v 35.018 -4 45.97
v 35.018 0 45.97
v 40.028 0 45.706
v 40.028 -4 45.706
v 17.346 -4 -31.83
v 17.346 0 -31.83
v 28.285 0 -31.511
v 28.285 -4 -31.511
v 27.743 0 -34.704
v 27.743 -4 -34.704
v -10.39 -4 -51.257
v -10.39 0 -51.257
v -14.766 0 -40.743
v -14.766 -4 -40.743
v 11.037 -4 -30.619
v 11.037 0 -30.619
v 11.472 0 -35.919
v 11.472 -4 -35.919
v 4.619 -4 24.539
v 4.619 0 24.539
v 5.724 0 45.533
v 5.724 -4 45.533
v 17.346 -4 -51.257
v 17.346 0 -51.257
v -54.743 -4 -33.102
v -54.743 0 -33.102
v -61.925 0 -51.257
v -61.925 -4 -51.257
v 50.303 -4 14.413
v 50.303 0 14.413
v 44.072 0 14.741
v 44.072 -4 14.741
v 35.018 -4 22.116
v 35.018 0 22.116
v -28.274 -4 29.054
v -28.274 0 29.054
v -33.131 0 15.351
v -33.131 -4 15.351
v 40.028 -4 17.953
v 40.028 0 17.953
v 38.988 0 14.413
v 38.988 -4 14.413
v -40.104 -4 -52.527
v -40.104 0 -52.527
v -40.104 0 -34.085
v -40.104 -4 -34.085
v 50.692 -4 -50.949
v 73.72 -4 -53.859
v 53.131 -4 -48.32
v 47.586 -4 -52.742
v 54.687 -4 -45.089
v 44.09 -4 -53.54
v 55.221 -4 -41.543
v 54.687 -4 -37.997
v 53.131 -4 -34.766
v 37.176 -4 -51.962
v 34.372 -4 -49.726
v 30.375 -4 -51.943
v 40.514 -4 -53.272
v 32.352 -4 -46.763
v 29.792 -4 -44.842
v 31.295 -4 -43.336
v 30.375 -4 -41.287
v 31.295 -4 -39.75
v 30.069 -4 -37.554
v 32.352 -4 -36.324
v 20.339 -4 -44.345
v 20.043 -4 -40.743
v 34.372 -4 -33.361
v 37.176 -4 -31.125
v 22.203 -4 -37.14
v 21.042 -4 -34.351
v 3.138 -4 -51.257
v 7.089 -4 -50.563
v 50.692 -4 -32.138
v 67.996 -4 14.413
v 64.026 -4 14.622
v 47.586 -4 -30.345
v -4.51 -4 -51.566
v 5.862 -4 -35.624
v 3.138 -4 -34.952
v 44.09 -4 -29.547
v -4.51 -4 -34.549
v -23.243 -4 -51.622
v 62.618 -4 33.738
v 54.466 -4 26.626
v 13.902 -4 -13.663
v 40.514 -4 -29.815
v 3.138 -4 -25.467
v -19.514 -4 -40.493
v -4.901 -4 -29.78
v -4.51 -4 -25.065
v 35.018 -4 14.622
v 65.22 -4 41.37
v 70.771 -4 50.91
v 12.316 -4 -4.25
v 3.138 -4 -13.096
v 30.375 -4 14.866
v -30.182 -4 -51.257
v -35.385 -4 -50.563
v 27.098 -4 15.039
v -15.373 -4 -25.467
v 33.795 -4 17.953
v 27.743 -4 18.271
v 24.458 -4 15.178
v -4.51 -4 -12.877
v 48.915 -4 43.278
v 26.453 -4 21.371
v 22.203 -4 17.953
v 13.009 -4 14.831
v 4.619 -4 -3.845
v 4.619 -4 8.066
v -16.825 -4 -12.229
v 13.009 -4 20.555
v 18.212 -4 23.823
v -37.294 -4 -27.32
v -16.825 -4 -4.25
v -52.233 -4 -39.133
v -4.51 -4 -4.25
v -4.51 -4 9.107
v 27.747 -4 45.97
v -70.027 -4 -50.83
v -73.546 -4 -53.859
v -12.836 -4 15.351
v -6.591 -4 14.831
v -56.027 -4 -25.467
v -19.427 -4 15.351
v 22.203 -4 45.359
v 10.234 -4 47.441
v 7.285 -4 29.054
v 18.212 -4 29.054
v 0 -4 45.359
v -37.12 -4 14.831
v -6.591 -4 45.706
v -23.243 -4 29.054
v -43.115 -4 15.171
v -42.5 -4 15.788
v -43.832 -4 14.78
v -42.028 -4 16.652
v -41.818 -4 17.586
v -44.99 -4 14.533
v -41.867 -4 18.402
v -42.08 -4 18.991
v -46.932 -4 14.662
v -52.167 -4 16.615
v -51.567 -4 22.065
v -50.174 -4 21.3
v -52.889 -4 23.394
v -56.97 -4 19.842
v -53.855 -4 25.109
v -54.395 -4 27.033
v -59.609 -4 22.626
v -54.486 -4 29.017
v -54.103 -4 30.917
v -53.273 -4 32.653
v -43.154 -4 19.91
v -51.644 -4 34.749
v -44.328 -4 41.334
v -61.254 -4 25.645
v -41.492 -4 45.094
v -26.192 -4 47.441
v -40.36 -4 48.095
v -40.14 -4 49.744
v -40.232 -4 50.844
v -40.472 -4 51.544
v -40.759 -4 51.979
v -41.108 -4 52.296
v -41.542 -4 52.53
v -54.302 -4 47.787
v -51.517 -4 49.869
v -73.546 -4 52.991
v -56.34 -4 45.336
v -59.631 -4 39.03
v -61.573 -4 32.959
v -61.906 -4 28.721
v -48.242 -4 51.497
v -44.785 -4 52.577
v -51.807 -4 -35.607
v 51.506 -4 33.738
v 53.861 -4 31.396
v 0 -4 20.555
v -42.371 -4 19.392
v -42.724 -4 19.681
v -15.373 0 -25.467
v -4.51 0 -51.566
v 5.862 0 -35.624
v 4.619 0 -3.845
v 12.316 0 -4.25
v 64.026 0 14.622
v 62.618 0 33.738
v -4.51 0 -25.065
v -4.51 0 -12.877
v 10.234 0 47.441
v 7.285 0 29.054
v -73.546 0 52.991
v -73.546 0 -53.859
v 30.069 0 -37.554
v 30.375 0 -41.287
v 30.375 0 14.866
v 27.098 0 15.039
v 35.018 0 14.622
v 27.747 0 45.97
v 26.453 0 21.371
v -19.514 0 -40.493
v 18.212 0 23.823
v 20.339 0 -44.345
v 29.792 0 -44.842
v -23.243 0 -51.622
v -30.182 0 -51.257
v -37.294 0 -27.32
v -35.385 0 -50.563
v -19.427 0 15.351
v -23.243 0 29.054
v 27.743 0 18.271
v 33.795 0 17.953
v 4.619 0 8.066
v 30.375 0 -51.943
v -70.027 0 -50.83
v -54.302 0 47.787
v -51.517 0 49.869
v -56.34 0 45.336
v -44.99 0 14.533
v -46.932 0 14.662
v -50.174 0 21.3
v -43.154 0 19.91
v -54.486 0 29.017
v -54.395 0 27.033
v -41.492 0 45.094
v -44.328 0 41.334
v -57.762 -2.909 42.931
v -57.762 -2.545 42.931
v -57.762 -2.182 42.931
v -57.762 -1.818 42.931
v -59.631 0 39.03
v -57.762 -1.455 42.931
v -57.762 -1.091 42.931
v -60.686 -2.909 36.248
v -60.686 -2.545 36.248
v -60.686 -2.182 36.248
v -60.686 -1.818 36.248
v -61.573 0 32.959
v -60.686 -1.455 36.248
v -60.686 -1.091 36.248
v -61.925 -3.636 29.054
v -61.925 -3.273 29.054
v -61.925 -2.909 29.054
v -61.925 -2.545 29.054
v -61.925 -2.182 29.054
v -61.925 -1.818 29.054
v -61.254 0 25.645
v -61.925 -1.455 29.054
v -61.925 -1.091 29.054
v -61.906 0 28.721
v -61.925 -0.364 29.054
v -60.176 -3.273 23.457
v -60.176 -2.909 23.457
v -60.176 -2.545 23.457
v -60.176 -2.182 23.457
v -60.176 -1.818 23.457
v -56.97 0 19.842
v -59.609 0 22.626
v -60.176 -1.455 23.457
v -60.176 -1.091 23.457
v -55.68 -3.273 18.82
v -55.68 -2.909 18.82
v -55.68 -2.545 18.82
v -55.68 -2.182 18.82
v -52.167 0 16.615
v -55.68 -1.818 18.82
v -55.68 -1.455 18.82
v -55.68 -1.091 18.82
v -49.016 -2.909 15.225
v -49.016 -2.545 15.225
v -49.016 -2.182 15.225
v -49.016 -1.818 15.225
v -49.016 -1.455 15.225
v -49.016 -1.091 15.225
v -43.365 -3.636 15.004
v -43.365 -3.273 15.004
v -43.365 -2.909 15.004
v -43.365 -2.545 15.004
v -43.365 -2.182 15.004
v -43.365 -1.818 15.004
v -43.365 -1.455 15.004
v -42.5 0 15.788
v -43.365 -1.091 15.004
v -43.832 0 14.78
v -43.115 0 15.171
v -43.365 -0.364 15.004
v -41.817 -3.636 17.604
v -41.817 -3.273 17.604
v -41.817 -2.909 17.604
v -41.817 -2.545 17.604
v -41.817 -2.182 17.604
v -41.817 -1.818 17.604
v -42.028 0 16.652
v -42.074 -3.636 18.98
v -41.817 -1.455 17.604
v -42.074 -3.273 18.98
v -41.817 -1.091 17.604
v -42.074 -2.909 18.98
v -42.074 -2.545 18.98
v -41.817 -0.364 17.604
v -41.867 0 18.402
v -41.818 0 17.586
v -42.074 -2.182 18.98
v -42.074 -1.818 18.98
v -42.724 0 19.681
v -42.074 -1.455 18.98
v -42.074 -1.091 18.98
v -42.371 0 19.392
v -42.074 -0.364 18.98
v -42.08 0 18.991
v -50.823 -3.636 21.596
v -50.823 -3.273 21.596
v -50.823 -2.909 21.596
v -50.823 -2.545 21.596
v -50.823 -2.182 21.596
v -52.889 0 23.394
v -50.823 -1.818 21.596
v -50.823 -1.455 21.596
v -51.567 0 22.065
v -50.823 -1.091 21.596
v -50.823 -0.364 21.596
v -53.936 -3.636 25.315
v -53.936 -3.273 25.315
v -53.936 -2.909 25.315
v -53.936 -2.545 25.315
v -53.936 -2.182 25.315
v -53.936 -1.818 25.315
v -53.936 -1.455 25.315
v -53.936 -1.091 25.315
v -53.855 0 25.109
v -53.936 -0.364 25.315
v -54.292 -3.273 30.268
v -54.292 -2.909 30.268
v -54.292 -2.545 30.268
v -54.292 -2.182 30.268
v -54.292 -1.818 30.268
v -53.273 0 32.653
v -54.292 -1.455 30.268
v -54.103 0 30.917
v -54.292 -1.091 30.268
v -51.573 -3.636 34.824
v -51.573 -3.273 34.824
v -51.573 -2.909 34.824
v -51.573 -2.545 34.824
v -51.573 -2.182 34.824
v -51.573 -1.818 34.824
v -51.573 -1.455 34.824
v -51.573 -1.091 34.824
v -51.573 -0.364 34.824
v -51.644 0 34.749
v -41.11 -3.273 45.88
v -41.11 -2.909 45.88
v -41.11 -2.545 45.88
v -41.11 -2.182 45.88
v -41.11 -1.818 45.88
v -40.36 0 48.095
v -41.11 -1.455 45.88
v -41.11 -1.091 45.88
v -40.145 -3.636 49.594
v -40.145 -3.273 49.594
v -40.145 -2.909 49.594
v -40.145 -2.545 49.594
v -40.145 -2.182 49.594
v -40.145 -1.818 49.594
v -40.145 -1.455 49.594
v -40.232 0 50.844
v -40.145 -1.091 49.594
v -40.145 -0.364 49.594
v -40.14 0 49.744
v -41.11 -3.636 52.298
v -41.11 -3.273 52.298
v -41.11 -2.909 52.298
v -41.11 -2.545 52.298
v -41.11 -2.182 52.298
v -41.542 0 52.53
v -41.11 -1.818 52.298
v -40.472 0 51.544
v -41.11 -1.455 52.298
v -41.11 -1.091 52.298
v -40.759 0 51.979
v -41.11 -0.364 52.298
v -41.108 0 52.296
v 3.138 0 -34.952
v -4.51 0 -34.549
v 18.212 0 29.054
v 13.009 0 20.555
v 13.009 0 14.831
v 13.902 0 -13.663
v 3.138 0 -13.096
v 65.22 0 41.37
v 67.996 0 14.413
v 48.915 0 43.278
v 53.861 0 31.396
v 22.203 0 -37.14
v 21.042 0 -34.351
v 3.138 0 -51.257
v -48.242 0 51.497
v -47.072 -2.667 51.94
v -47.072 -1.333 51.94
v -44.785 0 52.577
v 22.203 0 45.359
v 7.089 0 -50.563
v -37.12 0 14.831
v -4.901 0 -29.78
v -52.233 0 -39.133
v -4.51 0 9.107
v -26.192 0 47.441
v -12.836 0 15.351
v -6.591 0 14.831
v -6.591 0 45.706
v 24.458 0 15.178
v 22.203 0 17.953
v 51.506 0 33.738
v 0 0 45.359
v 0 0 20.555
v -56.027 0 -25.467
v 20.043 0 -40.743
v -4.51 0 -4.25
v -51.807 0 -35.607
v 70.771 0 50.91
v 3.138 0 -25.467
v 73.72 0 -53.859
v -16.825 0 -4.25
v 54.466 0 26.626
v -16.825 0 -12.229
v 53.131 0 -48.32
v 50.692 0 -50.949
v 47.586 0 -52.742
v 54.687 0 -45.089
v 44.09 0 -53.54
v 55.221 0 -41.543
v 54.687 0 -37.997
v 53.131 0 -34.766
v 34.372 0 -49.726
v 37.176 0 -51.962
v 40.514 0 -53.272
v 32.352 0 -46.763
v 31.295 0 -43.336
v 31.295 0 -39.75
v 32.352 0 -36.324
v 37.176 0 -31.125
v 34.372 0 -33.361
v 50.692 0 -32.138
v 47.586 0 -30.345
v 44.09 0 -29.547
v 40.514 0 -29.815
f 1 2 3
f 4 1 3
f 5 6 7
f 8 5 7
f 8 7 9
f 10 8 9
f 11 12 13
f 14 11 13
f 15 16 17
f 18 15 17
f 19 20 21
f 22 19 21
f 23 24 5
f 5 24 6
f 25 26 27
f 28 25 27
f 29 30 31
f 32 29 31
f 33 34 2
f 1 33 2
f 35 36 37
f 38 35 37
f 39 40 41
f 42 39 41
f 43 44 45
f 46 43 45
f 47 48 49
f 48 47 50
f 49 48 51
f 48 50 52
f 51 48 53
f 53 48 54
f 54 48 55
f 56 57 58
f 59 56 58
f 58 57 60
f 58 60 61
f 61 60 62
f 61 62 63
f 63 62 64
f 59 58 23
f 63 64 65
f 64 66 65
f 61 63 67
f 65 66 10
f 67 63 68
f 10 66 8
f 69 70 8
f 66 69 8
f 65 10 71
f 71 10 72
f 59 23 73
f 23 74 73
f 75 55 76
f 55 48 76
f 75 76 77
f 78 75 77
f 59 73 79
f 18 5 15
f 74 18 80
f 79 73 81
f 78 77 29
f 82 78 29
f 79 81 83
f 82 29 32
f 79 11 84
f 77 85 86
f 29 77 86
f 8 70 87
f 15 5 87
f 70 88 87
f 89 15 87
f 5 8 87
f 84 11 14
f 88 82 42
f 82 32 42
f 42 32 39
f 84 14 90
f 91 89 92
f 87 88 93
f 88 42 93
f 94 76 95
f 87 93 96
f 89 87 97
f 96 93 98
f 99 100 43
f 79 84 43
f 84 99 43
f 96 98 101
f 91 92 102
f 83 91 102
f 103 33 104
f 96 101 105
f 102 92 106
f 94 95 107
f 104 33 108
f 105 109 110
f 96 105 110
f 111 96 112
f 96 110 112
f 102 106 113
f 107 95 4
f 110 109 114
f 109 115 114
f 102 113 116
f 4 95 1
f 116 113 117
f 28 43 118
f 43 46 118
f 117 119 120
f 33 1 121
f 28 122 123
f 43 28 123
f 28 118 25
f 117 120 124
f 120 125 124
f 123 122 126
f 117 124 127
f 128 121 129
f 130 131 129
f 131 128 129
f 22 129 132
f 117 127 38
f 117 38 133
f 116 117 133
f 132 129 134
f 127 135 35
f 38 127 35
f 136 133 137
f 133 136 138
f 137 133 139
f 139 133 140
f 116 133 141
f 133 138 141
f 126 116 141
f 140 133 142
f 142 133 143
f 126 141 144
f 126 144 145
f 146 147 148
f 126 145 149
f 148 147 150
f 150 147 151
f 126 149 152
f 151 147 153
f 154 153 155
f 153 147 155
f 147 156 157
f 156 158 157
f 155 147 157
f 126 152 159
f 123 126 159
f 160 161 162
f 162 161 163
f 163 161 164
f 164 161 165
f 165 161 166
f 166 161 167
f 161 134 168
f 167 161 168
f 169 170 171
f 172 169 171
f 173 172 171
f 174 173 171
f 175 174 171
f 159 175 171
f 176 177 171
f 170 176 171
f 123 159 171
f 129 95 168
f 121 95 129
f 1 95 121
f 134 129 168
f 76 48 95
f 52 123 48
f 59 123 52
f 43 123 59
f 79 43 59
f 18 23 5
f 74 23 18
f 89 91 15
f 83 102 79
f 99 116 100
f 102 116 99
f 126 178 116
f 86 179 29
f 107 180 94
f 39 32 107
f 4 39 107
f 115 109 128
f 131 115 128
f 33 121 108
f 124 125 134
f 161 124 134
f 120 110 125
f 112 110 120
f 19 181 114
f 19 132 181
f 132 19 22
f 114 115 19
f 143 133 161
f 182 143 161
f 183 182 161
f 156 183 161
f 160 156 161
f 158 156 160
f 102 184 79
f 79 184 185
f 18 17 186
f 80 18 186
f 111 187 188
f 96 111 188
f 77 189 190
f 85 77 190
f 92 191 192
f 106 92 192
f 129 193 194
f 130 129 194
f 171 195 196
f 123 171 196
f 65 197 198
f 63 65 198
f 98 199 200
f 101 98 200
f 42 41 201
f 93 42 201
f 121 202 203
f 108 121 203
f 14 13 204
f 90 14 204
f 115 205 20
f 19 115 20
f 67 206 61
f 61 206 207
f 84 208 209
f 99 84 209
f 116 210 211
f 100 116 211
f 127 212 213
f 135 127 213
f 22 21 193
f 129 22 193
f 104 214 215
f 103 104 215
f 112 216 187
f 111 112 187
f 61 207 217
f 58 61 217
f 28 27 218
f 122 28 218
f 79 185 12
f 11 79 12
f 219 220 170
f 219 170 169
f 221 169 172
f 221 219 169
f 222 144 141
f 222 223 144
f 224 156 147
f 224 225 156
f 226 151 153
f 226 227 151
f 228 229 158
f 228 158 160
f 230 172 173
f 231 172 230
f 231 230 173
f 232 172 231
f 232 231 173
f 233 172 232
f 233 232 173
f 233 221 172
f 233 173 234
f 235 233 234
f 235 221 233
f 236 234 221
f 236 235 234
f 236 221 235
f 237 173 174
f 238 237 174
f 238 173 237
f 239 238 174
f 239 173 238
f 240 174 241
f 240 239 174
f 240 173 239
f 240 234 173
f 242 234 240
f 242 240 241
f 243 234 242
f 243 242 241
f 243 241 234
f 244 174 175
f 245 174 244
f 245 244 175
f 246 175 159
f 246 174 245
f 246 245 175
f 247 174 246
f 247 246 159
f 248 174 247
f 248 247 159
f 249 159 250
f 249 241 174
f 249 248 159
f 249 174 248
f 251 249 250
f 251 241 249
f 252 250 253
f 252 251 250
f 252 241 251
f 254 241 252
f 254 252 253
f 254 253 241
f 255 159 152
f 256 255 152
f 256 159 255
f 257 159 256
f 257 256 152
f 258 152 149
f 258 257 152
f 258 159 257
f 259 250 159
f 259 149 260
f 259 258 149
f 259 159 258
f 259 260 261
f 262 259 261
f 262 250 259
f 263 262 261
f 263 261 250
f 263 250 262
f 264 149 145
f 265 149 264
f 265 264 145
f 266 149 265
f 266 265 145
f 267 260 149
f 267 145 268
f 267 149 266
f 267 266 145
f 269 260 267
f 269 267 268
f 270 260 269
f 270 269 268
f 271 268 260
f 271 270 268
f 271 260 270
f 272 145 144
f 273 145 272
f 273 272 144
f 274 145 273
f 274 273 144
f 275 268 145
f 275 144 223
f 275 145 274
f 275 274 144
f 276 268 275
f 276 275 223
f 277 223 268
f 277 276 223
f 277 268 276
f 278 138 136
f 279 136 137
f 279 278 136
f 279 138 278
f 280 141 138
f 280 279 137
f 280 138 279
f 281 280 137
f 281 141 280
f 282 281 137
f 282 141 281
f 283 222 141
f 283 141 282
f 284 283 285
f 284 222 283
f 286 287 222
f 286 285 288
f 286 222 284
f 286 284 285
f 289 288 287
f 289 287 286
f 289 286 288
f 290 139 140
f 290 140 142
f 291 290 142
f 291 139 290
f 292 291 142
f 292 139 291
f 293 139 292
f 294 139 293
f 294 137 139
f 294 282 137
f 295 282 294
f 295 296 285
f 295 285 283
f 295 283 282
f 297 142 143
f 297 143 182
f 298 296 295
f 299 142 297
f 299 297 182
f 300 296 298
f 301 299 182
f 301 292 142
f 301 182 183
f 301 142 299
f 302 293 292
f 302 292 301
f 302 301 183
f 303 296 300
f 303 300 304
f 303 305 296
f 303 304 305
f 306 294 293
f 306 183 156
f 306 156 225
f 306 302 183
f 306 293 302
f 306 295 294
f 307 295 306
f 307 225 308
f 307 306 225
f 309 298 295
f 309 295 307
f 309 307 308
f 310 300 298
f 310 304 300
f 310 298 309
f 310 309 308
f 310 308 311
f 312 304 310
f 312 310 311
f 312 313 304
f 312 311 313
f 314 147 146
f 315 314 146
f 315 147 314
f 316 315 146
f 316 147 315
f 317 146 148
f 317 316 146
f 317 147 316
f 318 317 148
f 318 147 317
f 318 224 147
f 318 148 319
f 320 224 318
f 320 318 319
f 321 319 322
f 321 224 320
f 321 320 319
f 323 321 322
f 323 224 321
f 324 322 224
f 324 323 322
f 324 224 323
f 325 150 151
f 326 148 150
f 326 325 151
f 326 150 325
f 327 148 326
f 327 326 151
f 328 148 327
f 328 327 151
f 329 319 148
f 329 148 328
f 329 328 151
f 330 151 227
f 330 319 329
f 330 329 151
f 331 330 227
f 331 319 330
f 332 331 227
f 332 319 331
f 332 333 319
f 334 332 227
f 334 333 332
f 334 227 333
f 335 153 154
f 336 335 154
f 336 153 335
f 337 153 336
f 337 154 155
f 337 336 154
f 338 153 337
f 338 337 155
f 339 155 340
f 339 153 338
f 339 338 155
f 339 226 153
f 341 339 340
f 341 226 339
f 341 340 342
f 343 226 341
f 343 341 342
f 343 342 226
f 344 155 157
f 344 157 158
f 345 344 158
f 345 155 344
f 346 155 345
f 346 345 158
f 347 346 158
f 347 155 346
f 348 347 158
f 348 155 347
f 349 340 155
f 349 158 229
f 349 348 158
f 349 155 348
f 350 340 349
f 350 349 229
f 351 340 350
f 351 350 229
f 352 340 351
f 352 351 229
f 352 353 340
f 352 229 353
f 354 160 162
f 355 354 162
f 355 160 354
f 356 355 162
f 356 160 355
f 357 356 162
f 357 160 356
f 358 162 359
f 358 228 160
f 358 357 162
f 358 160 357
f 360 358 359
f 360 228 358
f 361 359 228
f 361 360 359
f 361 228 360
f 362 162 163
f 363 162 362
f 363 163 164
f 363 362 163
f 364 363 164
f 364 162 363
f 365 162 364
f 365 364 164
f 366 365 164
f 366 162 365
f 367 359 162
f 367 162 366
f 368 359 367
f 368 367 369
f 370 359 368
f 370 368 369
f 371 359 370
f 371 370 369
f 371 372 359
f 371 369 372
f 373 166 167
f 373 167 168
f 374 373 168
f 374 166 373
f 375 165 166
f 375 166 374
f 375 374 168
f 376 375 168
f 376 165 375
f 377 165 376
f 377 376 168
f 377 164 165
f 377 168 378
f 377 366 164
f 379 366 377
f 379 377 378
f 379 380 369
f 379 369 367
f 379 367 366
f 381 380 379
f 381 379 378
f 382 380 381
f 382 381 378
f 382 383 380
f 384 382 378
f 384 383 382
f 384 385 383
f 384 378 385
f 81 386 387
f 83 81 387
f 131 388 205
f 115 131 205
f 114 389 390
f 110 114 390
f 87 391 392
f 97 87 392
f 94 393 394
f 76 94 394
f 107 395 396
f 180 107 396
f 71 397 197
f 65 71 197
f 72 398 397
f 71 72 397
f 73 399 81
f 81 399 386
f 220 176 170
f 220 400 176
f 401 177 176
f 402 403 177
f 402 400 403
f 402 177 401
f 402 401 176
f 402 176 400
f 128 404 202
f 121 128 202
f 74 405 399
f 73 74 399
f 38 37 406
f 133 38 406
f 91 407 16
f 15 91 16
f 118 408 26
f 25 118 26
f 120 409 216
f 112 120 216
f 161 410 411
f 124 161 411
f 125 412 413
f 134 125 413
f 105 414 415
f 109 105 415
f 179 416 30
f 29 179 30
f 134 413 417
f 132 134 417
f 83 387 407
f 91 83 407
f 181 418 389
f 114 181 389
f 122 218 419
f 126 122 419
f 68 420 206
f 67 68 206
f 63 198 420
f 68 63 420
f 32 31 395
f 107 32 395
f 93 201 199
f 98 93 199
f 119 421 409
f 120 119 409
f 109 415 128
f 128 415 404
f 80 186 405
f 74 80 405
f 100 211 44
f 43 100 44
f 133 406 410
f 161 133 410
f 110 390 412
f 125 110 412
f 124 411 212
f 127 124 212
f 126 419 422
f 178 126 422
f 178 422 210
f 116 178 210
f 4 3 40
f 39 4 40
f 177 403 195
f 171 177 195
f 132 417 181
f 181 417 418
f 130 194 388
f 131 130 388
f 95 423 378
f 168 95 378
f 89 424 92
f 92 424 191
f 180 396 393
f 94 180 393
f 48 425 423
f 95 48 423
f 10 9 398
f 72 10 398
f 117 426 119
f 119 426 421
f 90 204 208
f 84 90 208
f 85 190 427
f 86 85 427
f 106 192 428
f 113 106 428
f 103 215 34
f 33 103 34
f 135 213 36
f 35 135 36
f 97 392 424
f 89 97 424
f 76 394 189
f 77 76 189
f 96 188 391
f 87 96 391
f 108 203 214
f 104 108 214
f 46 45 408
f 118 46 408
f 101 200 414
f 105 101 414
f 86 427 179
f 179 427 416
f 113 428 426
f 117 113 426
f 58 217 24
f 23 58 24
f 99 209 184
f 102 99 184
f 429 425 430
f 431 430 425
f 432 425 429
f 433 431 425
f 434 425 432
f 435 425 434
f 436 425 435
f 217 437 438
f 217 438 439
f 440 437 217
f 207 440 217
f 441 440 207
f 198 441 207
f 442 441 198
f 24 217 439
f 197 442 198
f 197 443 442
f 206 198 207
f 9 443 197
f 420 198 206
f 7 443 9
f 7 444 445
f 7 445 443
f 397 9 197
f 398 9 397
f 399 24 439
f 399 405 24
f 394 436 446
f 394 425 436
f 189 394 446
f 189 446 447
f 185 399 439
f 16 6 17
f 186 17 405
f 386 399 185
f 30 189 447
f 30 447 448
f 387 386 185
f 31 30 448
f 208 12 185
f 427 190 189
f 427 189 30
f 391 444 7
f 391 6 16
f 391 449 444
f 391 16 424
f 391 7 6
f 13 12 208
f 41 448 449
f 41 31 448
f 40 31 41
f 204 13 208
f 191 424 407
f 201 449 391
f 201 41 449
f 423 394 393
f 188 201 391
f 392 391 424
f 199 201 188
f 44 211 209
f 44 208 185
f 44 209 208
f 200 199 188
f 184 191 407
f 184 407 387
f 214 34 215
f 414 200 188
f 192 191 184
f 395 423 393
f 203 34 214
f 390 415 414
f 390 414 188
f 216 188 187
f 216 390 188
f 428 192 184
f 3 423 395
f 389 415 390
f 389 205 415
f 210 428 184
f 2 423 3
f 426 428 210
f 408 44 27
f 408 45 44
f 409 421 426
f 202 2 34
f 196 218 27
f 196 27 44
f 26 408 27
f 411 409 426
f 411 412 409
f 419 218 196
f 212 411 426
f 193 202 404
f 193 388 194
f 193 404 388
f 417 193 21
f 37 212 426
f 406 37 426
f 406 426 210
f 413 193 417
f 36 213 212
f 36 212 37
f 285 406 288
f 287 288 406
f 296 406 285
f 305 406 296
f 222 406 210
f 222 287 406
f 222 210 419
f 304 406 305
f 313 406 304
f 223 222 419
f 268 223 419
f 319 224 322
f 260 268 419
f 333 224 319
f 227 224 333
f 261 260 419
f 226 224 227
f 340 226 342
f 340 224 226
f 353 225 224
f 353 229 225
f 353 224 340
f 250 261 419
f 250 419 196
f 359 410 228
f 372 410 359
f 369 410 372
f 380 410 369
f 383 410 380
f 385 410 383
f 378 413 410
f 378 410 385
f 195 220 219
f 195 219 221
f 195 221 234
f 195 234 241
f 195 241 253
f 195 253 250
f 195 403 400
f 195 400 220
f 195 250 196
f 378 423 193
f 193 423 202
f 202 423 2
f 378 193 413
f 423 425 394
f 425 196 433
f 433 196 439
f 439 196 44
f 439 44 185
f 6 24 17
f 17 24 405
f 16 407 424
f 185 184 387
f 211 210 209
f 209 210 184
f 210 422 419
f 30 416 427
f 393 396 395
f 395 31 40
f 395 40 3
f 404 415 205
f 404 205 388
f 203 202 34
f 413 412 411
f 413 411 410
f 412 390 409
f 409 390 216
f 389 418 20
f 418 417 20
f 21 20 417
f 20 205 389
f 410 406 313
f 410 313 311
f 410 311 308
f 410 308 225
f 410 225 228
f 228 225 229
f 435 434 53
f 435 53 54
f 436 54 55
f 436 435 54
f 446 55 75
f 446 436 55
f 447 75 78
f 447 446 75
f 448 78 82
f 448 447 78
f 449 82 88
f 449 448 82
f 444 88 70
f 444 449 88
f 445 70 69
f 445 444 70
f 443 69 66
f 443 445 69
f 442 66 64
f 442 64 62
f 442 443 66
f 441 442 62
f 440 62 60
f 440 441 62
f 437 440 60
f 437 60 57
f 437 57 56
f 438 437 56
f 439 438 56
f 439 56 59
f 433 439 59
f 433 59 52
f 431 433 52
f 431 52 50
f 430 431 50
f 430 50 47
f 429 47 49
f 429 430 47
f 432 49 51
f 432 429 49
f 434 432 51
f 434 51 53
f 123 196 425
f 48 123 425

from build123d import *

# Parameters (mm, degrees)
F0_R     = 12.0300445465
F1_DEPTH = 4


with BuildPart() as f1:
    # F0 (on Front) → F1 (new body)
    with BuildSketch(Plane.XZ):
        with BuildLine():
            add(Edge.make_bspline(
                [(-51.517073065, 49.8692169785), (-54.6164711836, 48.0171055955), (-57.9732397932, 43.5175145949), (-64.2057426047, 28.5581561909), (-57.2019356759, 18.2399288793), (-42.6392432026, 12.0035799105), (-40.6559459772, 21.4666461937), (-52.4302351144, 19.2887594481), (-56.5033140512, 31.3521706241), (-47.1026408721, 38.590328812), (-40.563423389, 44.665361185), (-39.5708533621, 51.4986371042), (-41.384129942, 52.466124391), (-41.5416015443, 52.5298598494)],
                knots=[0, 0, 0, 0, 0.0892295044, 0.2003926069, 0.3015151058, 0.4063828736, 0.4680579017, 0.5546627521, 0.6439230859, 0.7400702389, 0.8305370512, 0.9045248096, 0.910932154, 0.910932154, 0.910932154, 0.910932154], degree=3))
            add(Edge.make_bspline(
                [(-44.7853297013, 52.5766443225), (-46.9791784585, 52.1409512456), (-49.5660584078, 51.0350873563), (-51.517073065, 49.8692169785)],
                knots=[0.9438316523, 0.9438316523, 0.9438316523, 0.9438316523, 1, 1, 1, 1], degree=3))
            Line((-44.7853297013, 52.5766443225), (-73.5462531447, 52.9914647341))
            Line((-73.5462531447, 52.9914647341), (-73.5462531447, -53.858757019))
            Line((-73.5462531447, -53.858757019), (73.7197175622, -53.858757019))
            Line((73.7197175622, -53.858757019), (70.7709267735, 50.9099699557))
            Line((70.7709267735, 50.9099699557), (-41.5416015443, 52.5298598494))
        make_face()
        Polygon((-54.742681822, -33.1018022917), (-61.9245618582, -51.2568838894), (-70.0272659035, -50.8304287042), (-56.0269840062, -25.4672017798), (-51.8067139403, -35.6068122516), (-37.2935049236, -27.3196585476), (-35.3854633868, -50.5630522966), (-40.1037498307, -52.5268795163), (-40.1037498307, -34.0845286846), (-52.2325170484, -39.1327179979), align=None, mode=Mode.SUBTRACT)
        Polygon((-23.243393749, -51.6220563997), (-30.1817189902, -51.2568838894), (-15.3727987967, -25.4672017798), (-4.5099123381, -51.5663460455), (-10.389733597, -51.2568838894), (-14.7657376005, -40.7431074425), (-19.5140424185, -40.4931983751), align=None, mode=Mode.SUBTRACT)
        Polygon((-4.5099123381, -4.2497245595), (-4.5099123381, 9.1065531597), (4.6191702269, 8.0658039078), (4.6191702269, -3.844655849), (12.3155284673, -4.2497245595), (13.9016113445, -13.6626154192), (3.1375800291, -13.0960913375), (3.1375800291, -25.4672017798), (-4.5099123381, -25.0647049397), (-4.5099123381, -12.8769812753), (-16.8254412711, -12.2287999839), (-16.8254412711, -4.2497245595), align=None, mode=Mode.SUBTRACT)
        Polygon((7.0885231353, -50.5630522966), (3.1375800291, -51.2568838894), (3.1375800291, -34.9518209696), (-4.5099123381, -34.5493241295), (-4.9014069475, -29.7802123571), (11.0372224126, -30.6190818379), (11.4723230555, -35.9193938953), (5.8621922288, -35.6241258751), align=None, mode=Mode.SUBTRACT)
        Polygon((17.345815897, -51.2568838894), (17.345815897, -31.8295732141), (28.284589117, -31.5107676877), (27.7426847126, -34.7037014665), (21.0419639668, -34.3510343703), (22.2026444972, -37.1396825555), (30.068846952, -37.5536903739), (30.3753046295, -41.2868986558), (20.0432007723, -40.7431074425), (20.3388671789, -44.3448585447), (29.7924494209, -44.8424120951), (30.3753046295, -51.942641755), align=None, mode=Mode.SUBTRACT)
        with Locations((43.1910790503, -41.5432304144)):
            Circle(F0_R, mode=Mode.SUBTRACT)
        Polygon((-33.1305079162, 15.3510468081), (-37.1200442314, 14.8306721821), (-26.1921808124, 47.4408045411), (-12.8359040245, 15.3510468081), (-19.4273144007, 15.3510468081), (-23.243393749, 29.0542412549), (-28.273679316, 29.0542412549), align=None, mode=Mode.SUBTRACT)
        Polygon((-6.5914099105, 14.8306721821), (-6.5914099105, 45.7062236965), (0, 45.3593097627), (0, 20.5547902733), (13.0093628541, 20.5547902733), (13.0093628541, 14.8306721821), align=None, mode=Mode.SUBTRACT)
        Polygon((4.6191702269, 24.5385780509), (5.7241199538, 45.5327667296), (10.2340299636, 47.4408045411), (7.2852415033, 29.0542412549), (18.2116690355, 29.0542412549), (18.2116690355, 23.8231882791), align=None, mode=Mode.SUBTRACT)
        Polygon((22.2026444972, 17.9529190063), (22.2026444972, 45.3593097627), (27.7472484163, 45.9698791885), (26.4525832232, 21.3710719499), (27.7426847126, 18.2714772869), (33.7953335203, 17.9529190063), (35.0184211311, 22.1159141511), (35.0184211311, 45.9698791885), (40.0279098077, 45.7062236965), (40.0279098077, 33.7376110256), (40.0279098077, 24.5385780509), (40.0279098077, 17.9529190063), (38.9878363627, 14.4128449646), (35.0184211311, 14.6217601241), (30.3753046295, 14.8661330021), (27.0978043062, 15.0386318371), (24.4576018304, 15.1775889099), align=None, mode=Mode.SUBTRACT)
        Polygon((51.5058212146, 33.7376110256), (50.3028668463, 14.4128449646), (44.0718992423, 14.7407883806), (48.9151999354, 43.277811259), (53.8606331153, 31.3959256746), (65.2202740312, 41.3697734475), (67.9955929518, 14.4128449646), (64.0261777202, 14.6217601241), (62.6183897257, 33.7376110256), (54.4658601284, 26.6258288175), align=None, mode=Mode.SUBTRACT)
    extrude(amount=F1_DEPTH)


solid = f1.part
